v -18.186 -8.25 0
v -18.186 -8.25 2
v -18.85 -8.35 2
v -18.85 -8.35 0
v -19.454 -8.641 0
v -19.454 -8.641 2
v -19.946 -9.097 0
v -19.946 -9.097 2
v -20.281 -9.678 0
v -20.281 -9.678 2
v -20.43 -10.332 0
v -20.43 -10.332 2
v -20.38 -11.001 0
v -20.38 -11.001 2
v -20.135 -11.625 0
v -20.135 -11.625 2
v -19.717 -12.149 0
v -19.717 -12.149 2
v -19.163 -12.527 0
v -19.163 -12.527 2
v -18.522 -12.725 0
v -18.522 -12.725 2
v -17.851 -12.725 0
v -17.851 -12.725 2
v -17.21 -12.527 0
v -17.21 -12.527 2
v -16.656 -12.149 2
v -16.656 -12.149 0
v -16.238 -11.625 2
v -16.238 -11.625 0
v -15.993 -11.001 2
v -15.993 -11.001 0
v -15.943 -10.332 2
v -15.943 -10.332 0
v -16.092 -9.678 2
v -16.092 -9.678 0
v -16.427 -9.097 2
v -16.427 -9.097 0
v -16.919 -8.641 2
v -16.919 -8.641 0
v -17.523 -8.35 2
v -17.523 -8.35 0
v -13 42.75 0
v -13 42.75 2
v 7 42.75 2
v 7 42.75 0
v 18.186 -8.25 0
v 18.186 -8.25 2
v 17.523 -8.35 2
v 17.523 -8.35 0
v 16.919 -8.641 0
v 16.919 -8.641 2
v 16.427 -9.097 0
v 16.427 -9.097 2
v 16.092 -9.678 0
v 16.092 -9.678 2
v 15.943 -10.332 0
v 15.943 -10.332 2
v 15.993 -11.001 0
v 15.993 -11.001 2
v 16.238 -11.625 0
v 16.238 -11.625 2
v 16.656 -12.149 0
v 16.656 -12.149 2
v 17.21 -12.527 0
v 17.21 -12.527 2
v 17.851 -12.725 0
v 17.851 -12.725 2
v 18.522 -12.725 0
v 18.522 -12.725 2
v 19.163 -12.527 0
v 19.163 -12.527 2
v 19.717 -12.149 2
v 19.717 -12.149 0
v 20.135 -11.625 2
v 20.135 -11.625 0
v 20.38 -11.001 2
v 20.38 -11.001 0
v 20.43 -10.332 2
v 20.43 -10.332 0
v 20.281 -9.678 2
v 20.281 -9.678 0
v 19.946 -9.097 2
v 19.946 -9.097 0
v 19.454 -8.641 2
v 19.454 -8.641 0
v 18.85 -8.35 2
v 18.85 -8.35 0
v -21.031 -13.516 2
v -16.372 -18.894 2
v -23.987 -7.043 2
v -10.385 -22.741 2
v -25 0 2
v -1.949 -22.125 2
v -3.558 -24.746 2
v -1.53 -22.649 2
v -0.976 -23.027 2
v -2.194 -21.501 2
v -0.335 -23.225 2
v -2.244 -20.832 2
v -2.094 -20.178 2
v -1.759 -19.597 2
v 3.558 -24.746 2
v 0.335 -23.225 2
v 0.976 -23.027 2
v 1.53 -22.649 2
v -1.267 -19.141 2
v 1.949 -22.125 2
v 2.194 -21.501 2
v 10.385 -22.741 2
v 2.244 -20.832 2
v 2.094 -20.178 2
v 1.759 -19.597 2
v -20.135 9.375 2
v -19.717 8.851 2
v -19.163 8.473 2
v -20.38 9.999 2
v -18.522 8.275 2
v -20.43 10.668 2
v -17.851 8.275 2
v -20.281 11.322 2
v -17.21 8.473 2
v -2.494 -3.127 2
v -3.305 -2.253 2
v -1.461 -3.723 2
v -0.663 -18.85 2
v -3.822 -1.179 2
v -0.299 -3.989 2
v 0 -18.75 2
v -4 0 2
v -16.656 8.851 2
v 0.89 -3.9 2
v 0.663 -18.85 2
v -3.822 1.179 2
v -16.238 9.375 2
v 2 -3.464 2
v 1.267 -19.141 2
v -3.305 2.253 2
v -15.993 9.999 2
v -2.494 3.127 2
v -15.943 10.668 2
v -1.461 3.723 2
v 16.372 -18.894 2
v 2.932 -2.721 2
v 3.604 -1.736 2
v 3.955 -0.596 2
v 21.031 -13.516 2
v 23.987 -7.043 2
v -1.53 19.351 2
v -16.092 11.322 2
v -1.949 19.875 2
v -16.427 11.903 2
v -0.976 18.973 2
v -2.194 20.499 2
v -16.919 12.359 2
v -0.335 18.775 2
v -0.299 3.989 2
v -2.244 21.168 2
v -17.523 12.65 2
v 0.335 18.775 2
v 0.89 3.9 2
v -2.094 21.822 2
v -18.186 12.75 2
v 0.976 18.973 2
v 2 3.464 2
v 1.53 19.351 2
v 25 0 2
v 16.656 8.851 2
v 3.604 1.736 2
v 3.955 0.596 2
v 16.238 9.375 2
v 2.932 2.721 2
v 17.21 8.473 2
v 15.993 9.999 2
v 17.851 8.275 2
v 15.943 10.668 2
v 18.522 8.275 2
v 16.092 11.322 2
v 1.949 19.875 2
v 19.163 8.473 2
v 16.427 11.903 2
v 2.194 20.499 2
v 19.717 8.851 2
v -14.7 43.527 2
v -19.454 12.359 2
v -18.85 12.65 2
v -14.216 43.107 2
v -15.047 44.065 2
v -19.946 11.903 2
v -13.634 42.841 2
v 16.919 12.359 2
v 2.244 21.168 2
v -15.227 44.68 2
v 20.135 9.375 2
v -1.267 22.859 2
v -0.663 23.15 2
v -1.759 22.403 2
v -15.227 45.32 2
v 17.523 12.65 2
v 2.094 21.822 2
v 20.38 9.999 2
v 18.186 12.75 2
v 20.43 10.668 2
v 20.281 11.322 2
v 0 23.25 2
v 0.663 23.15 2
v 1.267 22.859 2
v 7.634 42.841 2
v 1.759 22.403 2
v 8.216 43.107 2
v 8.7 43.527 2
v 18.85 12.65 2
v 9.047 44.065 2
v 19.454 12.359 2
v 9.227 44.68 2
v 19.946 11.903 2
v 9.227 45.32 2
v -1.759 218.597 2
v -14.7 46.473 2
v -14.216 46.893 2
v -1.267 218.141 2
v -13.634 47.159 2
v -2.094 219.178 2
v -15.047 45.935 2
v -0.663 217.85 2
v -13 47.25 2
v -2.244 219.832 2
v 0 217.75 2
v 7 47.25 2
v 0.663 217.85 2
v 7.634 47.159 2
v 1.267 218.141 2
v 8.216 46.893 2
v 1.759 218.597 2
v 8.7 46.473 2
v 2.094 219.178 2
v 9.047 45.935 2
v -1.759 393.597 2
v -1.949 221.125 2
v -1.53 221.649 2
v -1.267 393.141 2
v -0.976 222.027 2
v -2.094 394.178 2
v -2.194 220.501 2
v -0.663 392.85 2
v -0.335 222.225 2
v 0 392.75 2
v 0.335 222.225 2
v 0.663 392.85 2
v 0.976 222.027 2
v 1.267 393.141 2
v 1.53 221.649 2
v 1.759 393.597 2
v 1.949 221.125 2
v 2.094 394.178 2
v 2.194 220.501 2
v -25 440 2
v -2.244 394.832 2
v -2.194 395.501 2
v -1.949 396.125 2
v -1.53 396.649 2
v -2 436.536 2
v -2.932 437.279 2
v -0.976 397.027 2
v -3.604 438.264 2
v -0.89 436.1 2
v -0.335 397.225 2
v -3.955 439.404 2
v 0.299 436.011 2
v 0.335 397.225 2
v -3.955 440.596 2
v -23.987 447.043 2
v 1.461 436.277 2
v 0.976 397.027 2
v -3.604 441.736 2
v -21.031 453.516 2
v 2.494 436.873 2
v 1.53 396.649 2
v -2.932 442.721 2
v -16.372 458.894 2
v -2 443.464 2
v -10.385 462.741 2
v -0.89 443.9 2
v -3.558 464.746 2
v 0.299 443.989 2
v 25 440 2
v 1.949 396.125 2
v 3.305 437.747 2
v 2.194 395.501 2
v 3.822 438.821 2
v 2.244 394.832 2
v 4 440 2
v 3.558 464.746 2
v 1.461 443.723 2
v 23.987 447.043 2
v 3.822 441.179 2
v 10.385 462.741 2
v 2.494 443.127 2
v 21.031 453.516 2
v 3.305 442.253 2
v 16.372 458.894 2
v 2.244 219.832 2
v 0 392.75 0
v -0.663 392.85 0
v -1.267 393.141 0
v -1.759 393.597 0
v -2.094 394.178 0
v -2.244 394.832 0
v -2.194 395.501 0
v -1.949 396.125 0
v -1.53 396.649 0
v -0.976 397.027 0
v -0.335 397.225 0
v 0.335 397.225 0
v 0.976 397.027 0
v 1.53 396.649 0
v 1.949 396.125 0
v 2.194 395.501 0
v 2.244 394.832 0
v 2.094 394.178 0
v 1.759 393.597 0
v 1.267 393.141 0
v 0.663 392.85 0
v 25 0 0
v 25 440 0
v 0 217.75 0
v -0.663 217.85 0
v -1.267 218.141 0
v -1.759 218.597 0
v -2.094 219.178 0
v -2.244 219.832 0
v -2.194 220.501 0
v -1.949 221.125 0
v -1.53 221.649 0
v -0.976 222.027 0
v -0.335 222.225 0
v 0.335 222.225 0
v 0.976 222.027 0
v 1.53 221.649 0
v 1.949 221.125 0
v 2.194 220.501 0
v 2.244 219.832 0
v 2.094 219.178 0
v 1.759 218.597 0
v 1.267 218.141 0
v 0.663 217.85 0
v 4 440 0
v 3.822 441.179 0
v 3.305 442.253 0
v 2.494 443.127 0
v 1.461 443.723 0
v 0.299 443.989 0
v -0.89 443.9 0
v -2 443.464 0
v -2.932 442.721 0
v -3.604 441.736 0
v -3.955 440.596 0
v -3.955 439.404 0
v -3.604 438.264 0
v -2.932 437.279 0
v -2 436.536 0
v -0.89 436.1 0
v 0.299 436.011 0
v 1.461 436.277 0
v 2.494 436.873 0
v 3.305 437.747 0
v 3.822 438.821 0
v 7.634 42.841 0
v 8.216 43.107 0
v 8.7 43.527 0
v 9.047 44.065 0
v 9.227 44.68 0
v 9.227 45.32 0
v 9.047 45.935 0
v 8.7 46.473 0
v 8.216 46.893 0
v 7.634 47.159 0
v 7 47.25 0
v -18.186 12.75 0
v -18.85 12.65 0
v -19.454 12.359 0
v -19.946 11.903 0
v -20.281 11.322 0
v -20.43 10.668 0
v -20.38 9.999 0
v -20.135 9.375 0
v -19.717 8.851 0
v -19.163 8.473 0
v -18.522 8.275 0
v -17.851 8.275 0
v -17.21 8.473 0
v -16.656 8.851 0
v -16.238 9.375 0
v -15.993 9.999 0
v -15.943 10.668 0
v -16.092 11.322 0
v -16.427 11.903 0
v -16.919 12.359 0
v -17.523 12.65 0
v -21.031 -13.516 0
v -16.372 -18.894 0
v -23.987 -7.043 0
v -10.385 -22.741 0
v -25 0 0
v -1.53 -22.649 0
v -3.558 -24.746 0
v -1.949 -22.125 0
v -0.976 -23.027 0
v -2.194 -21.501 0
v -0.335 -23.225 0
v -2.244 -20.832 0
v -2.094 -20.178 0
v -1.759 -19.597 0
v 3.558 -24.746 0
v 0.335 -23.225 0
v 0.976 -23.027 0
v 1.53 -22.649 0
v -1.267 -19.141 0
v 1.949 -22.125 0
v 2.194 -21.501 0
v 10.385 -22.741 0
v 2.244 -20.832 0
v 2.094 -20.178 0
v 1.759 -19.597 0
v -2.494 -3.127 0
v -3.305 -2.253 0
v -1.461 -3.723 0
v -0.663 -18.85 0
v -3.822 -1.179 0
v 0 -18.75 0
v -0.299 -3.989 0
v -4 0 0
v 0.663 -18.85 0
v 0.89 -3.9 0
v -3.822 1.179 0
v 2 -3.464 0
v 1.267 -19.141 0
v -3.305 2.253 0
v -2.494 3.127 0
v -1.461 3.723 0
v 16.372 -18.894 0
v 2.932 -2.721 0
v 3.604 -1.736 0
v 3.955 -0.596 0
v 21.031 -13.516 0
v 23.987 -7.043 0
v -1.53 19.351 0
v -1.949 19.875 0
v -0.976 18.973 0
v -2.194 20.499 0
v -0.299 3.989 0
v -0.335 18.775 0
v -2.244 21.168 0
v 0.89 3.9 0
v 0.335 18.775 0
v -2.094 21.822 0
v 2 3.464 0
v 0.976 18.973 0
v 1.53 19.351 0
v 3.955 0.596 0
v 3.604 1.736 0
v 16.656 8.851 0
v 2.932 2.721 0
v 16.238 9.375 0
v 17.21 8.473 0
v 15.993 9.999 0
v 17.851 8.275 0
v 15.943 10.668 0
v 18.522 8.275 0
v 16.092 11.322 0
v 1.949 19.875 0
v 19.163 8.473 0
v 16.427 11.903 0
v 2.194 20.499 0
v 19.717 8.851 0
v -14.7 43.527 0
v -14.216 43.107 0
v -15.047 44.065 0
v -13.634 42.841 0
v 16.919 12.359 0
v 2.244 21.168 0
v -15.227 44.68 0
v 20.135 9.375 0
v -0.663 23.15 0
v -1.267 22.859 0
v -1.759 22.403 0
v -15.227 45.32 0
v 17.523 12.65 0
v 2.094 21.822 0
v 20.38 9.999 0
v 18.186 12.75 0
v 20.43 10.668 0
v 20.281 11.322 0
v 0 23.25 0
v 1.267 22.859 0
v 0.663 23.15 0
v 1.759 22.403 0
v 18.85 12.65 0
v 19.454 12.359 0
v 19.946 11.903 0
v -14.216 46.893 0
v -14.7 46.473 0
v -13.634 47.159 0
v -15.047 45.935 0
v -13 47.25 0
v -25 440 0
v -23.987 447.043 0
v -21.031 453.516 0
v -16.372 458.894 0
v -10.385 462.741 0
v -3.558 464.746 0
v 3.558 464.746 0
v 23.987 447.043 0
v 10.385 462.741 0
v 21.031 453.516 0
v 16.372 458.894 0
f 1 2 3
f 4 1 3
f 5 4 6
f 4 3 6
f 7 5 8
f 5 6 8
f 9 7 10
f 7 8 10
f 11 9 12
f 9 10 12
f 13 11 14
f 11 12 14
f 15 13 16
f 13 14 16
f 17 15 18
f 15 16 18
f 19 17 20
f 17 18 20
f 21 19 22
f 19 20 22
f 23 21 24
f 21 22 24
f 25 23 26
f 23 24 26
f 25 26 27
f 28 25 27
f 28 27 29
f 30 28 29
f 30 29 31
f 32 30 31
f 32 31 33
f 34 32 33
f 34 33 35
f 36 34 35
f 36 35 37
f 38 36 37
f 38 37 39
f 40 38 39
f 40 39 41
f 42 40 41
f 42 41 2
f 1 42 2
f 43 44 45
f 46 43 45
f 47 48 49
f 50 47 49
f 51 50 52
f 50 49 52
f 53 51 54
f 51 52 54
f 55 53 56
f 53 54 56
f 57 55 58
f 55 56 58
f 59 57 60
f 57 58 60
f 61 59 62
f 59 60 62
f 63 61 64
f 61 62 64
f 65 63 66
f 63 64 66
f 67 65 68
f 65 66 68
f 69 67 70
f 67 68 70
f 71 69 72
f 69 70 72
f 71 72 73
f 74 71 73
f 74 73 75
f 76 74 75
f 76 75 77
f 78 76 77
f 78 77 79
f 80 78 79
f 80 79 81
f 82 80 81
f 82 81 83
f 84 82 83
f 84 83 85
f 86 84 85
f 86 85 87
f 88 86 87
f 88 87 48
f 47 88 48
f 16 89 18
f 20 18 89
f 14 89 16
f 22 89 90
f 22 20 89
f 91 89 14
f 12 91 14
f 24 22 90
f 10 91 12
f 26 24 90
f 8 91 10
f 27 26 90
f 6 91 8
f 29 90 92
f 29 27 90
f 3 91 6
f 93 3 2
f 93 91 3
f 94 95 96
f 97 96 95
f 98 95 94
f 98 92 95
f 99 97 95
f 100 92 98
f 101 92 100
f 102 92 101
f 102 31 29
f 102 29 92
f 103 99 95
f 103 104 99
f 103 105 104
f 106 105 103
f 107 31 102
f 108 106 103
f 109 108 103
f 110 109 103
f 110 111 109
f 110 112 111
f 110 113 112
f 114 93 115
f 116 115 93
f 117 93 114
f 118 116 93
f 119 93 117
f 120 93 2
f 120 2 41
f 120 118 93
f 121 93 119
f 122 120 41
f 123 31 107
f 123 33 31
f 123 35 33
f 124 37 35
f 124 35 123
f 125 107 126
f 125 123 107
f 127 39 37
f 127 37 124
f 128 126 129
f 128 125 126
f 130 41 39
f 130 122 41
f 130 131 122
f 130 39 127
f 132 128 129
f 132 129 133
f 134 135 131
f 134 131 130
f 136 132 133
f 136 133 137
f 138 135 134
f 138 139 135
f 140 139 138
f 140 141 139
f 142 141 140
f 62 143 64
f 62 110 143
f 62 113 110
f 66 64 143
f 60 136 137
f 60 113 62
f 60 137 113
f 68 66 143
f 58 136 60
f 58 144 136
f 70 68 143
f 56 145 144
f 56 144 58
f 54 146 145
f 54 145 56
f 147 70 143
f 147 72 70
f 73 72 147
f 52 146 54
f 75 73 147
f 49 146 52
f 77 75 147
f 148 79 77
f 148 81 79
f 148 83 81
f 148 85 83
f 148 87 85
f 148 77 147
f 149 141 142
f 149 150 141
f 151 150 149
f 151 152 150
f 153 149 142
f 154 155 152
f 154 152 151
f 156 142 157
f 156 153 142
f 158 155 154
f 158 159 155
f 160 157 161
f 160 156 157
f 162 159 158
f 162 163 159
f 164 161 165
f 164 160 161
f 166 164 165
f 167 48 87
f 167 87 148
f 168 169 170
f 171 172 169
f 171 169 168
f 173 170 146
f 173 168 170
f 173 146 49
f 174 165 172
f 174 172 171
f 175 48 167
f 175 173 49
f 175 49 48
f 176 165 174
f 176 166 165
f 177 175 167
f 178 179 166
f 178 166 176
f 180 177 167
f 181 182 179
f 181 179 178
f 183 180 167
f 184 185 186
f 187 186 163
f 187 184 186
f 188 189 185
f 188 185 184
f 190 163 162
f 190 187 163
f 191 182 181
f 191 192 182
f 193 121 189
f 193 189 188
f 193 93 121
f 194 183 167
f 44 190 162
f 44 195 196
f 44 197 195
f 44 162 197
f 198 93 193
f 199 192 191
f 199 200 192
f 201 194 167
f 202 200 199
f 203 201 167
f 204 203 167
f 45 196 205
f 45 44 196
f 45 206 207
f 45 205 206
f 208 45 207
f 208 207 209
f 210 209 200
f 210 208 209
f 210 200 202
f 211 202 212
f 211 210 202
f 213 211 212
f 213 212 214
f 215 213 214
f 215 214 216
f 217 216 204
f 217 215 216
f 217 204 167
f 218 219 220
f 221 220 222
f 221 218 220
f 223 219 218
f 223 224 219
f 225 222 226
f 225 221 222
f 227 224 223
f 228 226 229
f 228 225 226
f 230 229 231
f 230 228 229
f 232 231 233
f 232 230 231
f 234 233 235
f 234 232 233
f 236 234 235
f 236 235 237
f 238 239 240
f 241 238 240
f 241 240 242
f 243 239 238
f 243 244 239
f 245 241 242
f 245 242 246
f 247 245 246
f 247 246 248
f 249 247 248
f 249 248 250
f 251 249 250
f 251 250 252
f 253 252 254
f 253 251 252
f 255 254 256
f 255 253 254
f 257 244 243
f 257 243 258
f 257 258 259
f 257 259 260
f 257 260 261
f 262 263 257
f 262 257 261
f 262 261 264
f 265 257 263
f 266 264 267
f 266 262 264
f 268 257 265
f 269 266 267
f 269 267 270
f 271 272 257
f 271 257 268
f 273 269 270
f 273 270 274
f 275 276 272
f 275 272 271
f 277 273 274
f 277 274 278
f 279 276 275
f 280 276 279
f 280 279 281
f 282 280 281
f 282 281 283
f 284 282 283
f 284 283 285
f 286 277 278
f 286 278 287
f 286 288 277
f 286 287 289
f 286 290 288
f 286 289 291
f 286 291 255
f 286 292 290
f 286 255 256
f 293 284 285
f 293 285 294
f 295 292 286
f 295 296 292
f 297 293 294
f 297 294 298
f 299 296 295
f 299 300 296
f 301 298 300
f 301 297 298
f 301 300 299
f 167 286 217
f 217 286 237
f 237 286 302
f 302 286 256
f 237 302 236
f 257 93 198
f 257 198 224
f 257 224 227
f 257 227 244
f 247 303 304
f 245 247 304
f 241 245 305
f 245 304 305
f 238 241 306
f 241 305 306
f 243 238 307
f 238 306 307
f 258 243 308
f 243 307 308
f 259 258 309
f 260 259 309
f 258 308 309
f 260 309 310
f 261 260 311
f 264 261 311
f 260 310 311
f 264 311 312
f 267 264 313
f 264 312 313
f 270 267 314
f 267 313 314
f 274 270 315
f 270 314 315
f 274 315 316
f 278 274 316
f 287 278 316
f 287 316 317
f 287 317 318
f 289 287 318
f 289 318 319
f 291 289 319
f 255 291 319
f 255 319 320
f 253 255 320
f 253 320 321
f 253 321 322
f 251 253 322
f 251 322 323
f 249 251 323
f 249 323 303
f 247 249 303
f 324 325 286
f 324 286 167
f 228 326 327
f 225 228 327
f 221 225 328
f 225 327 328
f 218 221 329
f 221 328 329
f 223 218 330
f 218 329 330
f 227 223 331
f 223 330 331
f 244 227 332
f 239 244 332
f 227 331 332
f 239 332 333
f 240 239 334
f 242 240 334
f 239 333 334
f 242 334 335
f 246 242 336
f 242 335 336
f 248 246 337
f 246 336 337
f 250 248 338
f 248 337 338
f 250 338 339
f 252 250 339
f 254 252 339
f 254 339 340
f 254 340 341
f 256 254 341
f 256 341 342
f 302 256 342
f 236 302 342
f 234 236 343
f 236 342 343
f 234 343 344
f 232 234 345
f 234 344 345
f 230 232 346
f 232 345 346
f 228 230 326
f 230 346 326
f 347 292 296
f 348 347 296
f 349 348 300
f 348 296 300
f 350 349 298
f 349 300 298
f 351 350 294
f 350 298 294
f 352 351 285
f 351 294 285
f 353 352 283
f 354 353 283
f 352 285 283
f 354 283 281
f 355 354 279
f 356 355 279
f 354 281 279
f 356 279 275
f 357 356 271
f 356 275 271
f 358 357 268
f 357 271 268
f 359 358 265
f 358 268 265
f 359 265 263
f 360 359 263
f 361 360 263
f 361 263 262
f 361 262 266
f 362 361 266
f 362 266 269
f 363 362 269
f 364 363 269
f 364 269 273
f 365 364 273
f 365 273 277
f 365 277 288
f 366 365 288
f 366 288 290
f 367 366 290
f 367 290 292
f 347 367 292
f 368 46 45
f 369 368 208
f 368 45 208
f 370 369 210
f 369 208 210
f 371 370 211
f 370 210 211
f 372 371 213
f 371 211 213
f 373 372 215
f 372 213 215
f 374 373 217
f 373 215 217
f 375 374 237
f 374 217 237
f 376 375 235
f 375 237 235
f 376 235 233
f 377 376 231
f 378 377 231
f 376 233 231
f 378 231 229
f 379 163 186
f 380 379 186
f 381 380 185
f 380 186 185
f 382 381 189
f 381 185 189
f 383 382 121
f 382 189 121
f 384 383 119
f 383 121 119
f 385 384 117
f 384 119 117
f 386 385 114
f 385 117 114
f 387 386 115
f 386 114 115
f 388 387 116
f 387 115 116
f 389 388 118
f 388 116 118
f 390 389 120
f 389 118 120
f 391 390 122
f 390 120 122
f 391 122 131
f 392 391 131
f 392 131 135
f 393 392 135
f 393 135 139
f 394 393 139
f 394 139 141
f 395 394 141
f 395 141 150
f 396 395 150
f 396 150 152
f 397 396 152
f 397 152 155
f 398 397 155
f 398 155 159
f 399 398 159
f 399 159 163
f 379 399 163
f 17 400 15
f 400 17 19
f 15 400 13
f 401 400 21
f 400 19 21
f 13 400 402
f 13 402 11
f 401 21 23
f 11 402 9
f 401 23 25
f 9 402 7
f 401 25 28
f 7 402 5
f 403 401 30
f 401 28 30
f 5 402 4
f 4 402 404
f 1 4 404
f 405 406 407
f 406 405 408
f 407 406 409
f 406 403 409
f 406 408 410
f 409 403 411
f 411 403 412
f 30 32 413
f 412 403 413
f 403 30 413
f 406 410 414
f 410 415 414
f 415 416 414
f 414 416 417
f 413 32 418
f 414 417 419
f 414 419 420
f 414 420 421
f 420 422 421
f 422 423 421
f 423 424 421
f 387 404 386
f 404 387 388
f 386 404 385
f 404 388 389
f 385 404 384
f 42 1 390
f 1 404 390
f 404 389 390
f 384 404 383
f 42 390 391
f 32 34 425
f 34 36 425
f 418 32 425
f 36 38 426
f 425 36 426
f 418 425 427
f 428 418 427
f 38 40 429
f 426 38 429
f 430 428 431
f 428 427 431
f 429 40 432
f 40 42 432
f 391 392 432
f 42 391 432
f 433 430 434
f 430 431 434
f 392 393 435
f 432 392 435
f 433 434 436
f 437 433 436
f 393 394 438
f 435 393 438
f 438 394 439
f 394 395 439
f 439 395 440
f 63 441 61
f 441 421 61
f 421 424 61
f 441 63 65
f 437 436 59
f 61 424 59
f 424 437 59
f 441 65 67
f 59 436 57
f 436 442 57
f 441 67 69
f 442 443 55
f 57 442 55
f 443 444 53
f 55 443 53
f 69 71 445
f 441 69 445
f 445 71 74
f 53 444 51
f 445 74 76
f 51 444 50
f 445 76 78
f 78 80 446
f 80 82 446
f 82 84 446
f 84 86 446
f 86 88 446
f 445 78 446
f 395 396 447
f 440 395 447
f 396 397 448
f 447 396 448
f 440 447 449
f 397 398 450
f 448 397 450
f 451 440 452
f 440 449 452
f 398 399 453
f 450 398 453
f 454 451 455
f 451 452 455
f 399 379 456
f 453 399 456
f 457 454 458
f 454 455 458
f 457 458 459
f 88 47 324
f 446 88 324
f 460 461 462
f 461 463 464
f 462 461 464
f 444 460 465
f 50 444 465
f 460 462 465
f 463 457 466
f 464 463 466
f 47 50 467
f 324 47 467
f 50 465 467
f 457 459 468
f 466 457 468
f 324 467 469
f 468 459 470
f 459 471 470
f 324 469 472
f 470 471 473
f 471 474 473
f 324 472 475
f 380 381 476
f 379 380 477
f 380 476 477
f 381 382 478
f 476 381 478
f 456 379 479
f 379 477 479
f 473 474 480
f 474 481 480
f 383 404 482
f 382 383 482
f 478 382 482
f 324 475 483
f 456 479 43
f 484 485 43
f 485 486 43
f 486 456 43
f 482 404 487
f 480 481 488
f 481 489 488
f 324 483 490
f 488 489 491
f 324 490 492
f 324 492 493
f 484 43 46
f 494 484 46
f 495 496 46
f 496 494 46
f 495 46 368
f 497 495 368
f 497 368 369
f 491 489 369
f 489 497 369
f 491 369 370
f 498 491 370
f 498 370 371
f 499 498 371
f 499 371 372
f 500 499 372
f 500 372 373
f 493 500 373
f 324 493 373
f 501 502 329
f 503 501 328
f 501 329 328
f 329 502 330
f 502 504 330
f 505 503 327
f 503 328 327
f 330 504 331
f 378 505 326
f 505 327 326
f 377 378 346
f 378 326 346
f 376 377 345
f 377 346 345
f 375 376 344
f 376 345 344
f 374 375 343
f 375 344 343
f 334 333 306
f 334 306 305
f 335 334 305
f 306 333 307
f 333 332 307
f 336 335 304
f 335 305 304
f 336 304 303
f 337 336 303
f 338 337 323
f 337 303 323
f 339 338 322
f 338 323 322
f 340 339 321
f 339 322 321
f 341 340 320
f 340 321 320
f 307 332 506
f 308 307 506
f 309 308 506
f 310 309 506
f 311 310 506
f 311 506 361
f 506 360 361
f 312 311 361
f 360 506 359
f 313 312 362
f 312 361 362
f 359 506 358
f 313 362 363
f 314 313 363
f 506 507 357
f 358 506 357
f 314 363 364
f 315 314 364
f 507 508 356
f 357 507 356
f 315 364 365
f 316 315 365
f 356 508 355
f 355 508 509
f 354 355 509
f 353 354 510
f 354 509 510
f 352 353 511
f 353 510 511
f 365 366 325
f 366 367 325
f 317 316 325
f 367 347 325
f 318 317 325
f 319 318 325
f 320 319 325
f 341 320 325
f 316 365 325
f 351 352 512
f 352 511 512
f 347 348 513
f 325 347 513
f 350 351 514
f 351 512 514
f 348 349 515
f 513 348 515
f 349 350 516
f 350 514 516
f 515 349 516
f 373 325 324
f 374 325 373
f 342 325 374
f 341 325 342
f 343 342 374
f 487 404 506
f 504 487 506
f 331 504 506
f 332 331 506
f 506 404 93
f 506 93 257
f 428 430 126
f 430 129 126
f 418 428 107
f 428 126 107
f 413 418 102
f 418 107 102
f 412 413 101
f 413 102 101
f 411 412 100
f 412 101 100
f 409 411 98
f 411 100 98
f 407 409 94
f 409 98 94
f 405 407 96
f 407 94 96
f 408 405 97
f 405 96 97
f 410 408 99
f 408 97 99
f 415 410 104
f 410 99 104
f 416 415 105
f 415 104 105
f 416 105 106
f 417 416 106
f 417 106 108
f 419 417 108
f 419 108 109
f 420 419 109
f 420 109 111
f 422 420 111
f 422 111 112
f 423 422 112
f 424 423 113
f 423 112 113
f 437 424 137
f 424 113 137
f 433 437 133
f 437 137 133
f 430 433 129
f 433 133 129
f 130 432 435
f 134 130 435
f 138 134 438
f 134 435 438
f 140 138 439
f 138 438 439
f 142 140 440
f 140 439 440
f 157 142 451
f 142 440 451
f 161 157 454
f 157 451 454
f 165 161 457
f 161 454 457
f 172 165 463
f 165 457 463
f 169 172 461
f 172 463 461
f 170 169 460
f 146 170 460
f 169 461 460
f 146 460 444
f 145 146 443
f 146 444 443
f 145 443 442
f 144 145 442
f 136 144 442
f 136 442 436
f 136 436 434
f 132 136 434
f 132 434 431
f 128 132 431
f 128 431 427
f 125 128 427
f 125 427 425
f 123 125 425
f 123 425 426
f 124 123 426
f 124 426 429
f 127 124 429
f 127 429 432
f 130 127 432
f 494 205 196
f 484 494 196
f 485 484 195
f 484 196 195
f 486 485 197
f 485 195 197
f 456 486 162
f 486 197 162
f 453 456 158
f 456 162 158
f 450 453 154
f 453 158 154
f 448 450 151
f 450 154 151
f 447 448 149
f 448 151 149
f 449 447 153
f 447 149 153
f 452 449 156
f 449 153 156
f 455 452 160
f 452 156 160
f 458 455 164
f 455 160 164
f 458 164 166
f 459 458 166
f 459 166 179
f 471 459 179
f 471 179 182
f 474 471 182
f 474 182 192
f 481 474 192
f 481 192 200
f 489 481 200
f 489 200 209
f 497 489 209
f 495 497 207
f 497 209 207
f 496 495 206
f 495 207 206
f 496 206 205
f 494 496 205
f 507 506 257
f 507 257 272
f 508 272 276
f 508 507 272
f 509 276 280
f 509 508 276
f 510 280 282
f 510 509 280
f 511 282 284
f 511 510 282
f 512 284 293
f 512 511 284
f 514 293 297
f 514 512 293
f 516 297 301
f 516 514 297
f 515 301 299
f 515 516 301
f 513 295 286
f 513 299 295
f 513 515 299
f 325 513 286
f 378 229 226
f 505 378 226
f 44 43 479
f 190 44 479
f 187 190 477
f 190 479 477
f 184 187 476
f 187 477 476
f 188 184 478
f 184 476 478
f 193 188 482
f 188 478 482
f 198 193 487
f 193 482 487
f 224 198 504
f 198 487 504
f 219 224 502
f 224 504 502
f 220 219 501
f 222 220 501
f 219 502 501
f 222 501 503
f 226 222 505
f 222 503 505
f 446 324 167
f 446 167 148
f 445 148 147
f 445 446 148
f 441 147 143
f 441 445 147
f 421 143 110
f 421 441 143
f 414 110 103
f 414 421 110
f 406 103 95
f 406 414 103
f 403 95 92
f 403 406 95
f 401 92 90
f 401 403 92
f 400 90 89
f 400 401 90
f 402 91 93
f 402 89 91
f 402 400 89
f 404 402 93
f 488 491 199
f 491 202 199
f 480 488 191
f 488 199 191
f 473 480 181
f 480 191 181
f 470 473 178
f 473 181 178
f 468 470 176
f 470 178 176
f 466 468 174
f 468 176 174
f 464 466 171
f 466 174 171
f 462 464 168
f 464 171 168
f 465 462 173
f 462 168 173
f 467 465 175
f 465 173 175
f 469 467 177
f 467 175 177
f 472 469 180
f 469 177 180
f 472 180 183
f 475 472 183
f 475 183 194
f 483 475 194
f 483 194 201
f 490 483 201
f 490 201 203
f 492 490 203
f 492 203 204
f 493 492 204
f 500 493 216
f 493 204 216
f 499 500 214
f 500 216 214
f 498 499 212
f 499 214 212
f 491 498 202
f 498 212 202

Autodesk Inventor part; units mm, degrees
ref_plane "YZ Plane" through (0, 0, 0) normal (1, 0, 0) x (0, 1, 0)
ref_plane "XZ Plane" through (0, 0, 0) normal (0, 1, 0) x (-1, 0, 0)
ref_plane "XY Plane" through (0, 0, 0) normal (0, 0, 1) x (1, 0, 0)
sketch "スケッチ1" plane through (0, 0, 0) normal (0, 0, 1) x (1, 0, 0)
  circle A0 centre (0, 0) radius 25
  circle A1 centre (0, 440) radius 25
  line L0 (-25, 0) -> (-25, 440)
  line L1 (25, 440) -> (25, 0)
  dimension "d0" = 50
  dimension "d1" = 50
  dimension "d2" = 440
extrude "プレート1" add sketch "スケッチ1" along normal blind 2
sketch "スケッチ4" plane through (0, 0, 0) normal (0, 0, -1) x (-1, 0, 0)
  circle A0 centre (0, 0) radius 4
  dimension "d28" = 8
extrude "押し出し1" cut sketch "スケッチ4" against normal blind 10
sketch "スケッチ5" plane through (0, 0, 0) normal (0, 0, -1) x (-1, 0, 0)
  circle A0 centre (0, 0) radius 21
  point P0 (0, 21)
  point P1 (-18.1865, 10.5)
  point P2 (-18.1865, -10.5)
  point P3 (0, -21)
  point P4 (18.1865, -10.5)
  point P5 (18.1865, 10.5)
  dimension "d31" = 42
  dimension "d34" = 360
hole "穴3" at (0, 21, 0) at (18.1865, 10.5, 0) at (18.1865, -10.5, 0) at (0, -21, 0) at (-18.1865, -10.5, 0) at (-18.1865, 10.5, 0) direction (0, 0, 1) diameter 4.5 end through all clearance for "Flat Head Machine Screw" size "M4" standard "Ansi Metric M Profile"
sketch "スケッチ6" plane through (0, 0, 2) normal (0, 0, 1) x (1, 0, 0)
  arc A0 (25, 440) -> (-25, 440) centre (0, 440) ccw projected
  circle A1 centre (0, 440) radius 4
  point P0 (0, 0)
  dimension "d43" = 8
extrude "押し出し2" cut sketch "スケッチ6" against normal blind 10
sketch "スケッチ8" plane through (0, 0, 2) normal (0, 0, 1) x (1, 0, 0)
  arc A0 (25, 440) -> (-25, 440) centre (0, 440) ccw projected
  point P0 (0, 0)
  point P1 (-13, 45)
  point P2 (0, 395)
  point P3 (0, 220)
  dimension "d54" = 45
  dimension "d55" = 220
  dimension "d71" = 45
  dimension "d72" = 13
hole "穴4" at (-13, 45, 2) at (0, 395, 2) at (0, 220, 2) direction (0, 0, -1) diameter 4.5 end through all clearance for "Flat Head Machine Screw" size "M4" standard "Ansi Metric M Profile"
sketch "スケッチ10" plane through (0, 0, 2) normal (0, 0, 1) x (1, 0, 0)
  circle A0 centre (7, 45) radius 2.25
  line L0 (7, 45) -> (-13, 45) construction
  line L1 (7, 47.25) -> (-13, 47.25)
  line L2 (-13, 42.75) -> (7, 42.75)
  arc A1 (7, 42.75) -> (7, 47.25) centre (7, 45) ccw
  arc A2 (-13, 47.25) -> (-13, 42.75) centre (-13, 45) ccw
  circle A3 centre (-13, 45) radius 2.25 projected
  point P0 (0, 0)
  point P1 (-3, 45)
  point P2 (7, 47.25)
  point P3 (7, 42.75)
  dimension "d68" = 20
extrude "押し出し3" cut sketch "スケッチ10" against normal blind 10
equation "\"d41\" = Thickness"
equation "\"d3\" = Thickness"
equation "\"BendRadius\" = Thickness"
equation "\"BendReliefWidth\" = Thickness"
equation "\"BendReliefDepth\" = 0.5 * Thickness"
equation "\"CornerReliefSize\" = 4 * Thickness"
equation "\"MinimumRemnant\" = 2 * Thickness"
equation "\"TransitionRadius\" = BendRadius"
equation "\"JacobiRadiusSize\" = Thickness"
equation "\"GapSize\" = Thickness"
equation "\"Thickness\" = 2"
properties part number "link3-plate1" material "CFRP"
